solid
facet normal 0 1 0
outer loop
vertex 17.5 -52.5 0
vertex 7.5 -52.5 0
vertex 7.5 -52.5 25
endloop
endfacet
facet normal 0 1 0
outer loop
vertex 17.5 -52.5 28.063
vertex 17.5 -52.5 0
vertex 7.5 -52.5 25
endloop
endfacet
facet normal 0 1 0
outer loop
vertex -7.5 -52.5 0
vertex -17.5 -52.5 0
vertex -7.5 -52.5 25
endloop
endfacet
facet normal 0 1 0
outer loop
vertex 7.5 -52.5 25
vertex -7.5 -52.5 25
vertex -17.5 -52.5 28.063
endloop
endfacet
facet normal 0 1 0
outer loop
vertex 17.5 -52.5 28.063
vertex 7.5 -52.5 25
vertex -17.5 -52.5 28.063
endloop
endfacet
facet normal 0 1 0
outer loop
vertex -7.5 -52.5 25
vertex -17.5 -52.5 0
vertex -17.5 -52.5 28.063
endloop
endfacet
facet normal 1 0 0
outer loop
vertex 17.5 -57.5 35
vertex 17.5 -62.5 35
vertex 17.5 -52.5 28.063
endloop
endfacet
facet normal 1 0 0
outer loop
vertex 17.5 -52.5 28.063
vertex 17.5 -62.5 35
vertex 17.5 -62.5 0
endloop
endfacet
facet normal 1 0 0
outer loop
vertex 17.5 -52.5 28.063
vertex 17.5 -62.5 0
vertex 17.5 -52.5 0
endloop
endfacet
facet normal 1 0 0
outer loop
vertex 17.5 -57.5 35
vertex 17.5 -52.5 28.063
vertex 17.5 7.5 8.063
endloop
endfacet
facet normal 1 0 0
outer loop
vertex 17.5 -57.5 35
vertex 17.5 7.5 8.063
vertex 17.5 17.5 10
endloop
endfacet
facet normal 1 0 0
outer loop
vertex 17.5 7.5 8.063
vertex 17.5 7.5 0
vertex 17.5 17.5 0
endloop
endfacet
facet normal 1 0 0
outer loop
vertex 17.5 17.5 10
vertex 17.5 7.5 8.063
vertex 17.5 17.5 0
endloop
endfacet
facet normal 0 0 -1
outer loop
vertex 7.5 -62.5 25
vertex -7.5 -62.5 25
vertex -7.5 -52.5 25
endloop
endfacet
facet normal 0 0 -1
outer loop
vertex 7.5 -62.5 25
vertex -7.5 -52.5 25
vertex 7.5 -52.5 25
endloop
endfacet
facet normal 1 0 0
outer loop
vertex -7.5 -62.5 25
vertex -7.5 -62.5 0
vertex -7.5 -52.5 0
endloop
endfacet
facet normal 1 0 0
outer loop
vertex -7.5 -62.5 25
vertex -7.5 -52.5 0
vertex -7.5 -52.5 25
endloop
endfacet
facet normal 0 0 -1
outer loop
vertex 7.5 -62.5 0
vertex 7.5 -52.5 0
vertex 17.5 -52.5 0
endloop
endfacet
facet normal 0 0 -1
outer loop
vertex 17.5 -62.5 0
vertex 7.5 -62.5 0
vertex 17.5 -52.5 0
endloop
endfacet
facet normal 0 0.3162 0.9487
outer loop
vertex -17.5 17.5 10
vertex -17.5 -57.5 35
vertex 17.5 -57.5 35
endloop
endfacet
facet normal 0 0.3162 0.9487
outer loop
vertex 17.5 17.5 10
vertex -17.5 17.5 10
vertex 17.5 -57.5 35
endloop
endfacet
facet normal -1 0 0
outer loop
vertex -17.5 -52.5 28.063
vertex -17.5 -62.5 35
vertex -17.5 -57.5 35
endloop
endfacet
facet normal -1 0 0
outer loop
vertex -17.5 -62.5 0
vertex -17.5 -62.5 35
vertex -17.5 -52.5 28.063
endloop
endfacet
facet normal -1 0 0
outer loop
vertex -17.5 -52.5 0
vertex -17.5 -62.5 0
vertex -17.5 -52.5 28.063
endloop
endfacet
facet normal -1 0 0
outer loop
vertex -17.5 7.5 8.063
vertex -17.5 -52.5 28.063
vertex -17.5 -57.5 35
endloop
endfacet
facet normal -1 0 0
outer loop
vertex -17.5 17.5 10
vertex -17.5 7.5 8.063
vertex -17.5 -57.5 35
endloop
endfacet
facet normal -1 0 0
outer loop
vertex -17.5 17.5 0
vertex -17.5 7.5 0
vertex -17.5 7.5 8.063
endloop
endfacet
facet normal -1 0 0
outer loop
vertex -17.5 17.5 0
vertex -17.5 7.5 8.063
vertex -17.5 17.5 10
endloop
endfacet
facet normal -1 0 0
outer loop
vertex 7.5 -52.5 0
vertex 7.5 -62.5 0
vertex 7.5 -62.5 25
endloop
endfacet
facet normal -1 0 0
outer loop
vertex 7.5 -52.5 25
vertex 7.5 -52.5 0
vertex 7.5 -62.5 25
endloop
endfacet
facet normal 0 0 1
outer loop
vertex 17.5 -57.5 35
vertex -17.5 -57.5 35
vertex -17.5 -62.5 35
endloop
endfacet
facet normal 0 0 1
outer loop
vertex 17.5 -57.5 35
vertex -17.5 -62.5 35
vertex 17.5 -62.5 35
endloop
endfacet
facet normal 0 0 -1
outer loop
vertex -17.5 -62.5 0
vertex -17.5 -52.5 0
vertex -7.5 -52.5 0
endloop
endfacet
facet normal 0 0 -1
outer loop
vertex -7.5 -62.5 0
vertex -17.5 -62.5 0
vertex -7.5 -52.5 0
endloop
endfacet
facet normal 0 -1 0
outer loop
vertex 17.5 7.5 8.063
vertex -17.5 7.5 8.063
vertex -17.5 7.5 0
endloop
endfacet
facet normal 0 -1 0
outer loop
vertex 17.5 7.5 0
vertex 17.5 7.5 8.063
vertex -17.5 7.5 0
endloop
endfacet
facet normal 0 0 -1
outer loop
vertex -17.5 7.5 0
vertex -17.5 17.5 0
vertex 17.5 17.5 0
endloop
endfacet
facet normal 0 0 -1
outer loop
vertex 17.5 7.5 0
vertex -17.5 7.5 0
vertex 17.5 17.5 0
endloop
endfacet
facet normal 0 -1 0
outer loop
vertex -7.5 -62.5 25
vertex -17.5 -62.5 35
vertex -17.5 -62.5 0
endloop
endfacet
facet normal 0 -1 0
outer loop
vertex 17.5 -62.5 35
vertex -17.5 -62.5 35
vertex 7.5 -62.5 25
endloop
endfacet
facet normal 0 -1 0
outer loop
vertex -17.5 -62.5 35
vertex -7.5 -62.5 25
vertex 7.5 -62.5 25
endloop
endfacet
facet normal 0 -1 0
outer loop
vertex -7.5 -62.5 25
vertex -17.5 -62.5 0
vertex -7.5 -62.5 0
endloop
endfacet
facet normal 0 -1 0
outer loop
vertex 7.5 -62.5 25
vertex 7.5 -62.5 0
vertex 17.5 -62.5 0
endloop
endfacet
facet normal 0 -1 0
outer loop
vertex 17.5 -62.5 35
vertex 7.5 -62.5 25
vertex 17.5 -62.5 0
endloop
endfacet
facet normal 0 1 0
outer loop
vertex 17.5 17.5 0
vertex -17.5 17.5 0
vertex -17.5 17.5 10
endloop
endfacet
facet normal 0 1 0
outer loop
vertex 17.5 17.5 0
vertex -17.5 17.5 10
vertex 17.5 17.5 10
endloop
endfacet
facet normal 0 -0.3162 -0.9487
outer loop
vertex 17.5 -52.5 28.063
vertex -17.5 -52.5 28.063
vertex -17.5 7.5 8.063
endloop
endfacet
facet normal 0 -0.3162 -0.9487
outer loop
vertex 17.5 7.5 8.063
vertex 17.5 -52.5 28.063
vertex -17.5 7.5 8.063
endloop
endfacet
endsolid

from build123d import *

# Parameters (mm, degrees)
F0_W     = 35
F0_H     = 80
F1_DEPTH = 35
F2_SIZE2 = 25
F2_SIZE  = 75
F4_DEPTH = 35.001
F5_W     = 15
F5_H     = 25
F6_DEPTH = 10


with BuildPart() as f1:
    # F0 (on Top) → F1 (new body)
    with BuildSketch(Plane.XY):
        with Locations((0, -22.5)):
            Rectangle(F0_W, F0_H)
    extrude(amount=F1_DEPTH)

    # F2
    f2_edges = [f1.edges().sort_by_distance(p)[0] for p in [
        (0, 17.5, 35),
    ]]
    f2_side = f1.faces().sort_by_distance((0, -22.5, 35))[0]
    chamfer(f2_edges, length=F2_SIZE, length2=F2_SIZE2, reference=f2_side)

    # F3 (on face) → F4 (cut, through all)
    with BuildSketch(Plane(origin=(-17.5, 0, 0), x_dir=(0, -1, 0), z_dir=(-1, 0, 0))):
        Polygon((-7.5, 8.0628705664), (-7.5, 0), (52.5, 0), (52.5, 28.0628705664), align=None)
    extrude(amount=-F4_DEPTH, mode=Mode.SUBTRACT)

    # F5 (on face) → F6 (cut)
    with BuildSketch(Plane.XZ.offset(62.5)):
        with Locations((0, 12.5)):
            Rectangle(F5_W, F5_H)
    extrude(amount=-F6_DEPTH, mode=Mode.SUBTRACT)


solid = f1.part
